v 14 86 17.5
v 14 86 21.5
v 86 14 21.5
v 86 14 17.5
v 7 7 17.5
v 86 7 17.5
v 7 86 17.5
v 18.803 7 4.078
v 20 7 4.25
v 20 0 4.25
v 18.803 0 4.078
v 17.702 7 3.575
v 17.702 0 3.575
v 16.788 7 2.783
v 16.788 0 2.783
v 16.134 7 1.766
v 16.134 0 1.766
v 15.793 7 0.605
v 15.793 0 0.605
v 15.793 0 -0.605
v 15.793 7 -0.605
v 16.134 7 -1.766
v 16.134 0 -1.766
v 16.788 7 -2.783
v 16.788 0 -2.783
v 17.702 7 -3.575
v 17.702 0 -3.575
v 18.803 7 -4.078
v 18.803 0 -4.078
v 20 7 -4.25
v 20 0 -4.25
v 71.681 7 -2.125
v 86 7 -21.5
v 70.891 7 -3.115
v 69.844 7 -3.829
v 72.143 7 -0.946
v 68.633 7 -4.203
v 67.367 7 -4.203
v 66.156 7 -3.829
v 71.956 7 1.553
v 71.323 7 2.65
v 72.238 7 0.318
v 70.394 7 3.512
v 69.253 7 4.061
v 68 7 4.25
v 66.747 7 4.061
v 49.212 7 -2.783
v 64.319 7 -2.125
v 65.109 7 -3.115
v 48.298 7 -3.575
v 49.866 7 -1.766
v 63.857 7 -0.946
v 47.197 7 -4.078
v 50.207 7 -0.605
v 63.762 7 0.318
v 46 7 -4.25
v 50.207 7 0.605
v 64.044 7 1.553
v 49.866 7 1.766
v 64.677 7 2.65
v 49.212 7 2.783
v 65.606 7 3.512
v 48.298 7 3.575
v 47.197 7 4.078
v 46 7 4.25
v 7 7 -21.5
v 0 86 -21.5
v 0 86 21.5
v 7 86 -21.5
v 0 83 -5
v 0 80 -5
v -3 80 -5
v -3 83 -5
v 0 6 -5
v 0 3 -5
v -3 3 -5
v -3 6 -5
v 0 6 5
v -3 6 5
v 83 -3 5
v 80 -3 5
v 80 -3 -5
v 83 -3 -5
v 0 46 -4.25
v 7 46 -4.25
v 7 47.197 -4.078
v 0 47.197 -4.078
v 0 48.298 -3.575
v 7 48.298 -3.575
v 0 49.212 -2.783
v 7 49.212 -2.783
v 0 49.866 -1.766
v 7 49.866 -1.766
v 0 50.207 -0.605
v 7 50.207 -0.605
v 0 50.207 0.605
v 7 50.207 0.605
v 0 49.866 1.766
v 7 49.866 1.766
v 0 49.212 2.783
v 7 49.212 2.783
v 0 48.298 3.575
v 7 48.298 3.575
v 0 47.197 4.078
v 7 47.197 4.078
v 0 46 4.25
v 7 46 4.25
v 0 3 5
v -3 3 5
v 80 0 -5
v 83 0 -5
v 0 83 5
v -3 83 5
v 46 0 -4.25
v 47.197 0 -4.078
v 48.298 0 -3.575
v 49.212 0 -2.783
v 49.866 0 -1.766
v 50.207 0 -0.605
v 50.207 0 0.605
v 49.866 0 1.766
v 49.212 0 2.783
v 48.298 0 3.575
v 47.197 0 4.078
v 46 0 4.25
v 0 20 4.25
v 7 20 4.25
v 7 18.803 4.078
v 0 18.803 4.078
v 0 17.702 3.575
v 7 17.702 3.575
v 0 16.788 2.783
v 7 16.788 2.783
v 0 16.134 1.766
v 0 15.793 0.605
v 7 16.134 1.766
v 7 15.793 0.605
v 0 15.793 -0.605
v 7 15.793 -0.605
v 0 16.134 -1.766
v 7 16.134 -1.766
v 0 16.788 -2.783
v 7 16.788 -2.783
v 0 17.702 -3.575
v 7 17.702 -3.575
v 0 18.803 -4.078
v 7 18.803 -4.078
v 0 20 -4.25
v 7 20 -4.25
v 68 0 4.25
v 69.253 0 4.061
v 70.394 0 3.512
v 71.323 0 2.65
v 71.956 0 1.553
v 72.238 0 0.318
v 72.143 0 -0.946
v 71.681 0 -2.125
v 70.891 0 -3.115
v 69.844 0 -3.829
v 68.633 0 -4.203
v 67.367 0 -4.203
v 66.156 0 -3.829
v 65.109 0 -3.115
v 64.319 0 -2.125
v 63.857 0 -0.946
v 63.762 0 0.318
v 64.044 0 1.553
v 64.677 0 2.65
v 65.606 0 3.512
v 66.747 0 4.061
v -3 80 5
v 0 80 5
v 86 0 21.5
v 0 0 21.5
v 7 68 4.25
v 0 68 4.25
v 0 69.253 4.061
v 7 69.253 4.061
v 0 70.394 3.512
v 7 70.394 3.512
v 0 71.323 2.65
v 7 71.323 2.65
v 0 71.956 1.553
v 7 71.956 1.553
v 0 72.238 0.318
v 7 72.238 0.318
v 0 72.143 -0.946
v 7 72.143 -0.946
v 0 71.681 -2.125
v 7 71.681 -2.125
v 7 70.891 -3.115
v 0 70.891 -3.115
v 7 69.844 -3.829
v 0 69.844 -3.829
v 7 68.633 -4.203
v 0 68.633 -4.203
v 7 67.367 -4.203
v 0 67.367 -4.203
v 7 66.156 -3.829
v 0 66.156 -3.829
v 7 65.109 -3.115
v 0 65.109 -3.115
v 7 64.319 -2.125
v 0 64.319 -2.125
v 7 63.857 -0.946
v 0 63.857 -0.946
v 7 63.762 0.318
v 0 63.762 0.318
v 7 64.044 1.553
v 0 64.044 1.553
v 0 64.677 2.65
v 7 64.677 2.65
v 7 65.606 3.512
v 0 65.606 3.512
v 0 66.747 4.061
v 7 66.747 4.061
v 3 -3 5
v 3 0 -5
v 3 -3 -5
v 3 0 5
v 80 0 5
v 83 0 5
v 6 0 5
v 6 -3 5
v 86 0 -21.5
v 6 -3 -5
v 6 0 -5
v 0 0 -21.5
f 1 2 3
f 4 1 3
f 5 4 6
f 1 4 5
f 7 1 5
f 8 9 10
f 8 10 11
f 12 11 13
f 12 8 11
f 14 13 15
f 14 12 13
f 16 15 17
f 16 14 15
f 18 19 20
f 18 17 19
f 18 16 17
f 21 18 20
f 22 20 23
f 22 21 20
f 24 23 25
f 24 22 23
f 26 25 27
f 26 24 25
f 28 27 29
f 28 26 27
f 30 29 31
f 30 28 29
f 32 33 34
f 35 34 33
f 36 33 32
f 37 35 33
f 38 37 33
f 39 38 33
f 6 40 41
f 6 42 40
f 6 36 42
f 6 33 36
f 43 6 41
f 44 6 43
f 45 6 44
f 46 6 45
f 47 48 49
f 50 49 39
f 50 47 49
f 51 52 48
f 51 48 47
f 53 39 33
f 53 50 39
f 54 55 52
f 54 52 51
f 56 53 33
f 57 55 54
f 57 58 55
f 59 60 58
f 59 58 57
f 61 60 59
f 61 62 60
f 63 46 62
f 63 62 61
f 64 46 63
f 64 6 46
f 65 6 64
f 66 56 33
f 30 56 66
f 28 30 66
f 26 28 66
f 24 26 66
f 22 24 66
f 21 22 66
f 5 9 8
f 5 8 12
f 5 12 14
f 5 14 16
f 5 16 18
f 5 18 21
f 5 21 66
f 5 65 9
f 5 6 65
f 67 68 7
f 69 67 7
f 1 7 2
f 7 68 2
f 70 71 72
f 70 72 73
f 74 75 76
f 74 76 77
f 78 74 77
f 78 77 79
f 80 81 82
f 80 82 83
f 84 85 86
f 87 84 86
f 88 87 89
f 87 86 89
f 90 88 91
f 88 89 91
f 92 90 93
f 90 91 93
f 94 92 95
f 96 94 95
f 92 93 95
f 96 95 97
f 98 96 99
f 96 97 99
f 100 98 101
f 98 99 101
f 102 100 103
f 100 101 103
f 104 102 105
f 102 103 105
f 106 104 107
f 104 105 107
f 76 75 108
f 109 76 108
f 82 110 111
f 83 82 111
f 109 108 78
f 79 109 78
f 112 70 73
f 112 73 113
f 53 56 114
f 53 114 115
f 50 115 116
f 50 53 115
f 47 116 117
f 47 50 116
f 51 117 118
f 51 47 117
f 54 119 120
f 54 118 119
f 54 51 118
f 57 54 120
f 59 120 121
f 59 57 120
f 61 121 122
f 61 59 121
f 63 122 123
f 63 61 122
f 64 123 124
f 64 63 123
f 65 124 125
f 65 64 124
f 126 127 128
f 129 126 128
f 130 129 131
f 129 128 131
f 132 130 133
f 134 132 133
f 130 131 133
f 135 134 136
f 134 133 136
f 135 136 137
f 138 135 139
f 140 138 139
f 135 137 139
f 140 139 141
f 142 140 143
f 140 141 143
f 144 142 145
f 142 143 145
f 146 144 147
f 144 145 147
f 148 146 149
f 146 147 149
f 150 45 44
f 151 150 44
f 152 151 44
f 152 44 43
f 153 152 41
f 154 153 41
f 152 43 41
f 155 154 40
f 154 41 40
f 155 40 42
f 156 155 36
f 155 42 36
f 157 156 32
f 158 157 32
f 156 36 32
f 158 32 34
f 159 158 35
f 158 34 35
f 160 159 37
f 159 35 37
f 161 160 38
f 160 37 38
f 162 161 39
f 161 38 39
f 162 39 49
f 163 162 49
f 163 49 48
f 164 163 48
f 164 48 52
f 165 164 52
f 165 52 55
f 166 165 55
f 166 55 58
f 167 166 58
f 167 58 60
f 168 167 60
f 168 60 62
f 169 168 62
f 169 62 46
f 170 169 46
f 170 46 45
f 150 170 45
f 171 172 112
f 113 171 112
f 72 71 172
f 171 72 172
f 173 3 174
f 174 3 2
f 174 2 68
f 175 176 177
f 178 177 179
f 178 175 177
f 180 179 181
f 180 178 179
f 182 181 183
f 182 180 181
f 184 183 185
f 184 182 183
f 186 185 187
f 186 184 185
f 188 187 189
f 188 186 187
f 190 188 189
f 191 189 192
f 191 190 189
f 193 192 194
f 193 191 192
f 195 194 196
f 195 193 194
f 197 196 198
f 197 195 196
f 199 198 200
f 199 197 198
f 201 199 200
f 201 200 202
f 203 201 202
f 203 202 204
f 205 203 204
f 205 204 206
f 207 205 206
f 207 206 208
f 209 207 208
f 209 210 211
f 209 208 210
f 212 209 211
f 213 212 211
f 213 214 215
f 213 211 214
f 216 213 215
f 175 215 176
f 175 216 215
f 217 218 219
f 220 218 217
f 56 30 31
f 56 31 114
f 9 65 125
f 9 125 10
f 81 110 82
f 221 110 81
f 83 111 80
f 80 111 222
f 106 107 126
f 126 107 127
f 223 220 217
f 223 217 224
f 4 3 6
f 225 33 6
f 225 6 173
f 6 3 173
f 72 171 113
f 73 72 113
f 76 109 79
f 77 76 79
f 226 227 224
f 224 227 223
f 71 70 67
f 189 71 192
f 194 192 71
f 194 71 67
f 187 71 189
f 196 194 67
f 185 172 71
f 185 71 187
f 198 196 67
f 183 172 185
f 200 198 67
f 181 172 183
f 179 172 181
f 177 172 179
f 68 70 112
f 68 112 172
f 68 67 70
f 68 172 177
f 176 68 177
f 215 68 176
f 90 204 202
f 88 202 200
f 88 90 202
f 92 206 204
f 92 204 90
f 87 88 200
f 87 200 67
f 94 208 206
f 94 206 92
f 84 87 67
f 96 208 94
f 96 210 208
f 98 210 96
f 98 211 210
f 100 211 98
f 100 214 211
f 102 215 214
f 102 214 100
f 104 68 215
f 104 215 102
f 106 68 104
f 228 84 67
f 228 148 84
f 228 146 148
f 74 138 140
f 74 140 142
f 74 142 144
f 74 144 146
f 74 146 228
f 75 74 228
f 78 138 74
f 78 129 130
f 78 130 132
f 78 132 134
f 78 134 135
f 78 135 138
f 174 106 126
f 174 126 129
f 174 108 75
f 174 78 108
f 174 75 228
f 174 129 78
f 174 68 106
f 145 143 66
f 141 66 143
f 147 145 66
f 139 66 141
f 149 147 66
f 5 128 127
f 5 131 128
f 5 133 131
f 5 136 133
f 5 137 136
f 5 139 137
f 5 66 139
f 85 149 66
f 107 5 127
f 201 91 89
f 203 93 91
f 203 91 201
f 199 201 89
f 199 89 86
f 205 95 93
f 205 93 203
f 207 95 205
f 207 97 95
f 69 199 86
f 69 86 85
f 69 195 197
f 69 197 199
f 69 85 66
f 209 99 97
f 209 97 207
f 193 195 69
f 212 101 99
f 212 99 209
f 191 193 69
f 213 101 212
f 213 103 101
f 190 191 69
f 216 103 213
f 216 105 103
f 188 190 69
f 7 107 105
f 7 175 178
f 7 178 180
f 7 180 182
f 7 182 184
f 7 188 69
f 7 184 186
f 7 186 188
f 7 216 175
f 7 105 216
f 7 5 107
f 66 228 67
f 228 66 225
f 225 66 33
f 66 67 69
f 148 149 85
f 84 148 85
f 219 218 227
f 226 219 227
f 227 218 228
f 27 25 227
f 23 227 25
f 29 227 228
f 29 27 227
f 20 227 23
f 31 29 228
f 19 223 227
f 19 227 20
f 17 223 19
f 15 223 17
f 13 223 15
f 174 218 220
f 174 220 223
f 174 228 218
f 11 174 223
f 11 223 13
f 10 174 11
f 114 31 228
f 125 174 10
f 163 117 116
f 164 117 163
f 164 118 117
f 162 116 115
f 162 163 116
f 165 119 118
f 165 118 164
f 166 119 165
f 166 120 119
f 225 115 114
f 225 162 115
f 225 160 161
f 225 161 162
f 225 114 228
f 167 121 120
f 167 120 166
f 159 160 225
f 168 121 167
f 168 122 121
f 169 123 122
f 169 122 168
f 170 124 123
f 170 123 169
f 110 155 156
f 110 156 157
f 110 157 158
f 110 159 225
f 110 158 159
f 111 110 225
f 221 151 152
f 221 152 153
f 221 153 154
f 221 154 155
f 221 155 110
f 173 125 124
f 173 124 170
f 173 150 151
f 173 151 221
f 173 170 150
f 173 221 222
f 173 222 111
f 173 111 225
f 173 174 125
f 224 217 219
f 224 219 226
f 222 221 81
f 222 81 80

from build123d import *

# Parameters (mm, degrees)
EXTRUDE_1_DEPTH     = 21.5
EXTRUDE_2_DEPTH     = 4
SKETCH_3_R          = 4.25
CUT_EXTRUDE_1_DEPTH = 8
SKETCH_4_W          = 3
SKETCH_4_H          = 10
EXTRUDE_3_DEPTH     = 3


with BuildPart() as part:
    # Эскиз1 → Бобышка-Вытянуть1 (new body, symmetric)
    with BuildSketch(Plane.XY):
        Polygon((0, 86), (0, 0), (86, 0), (86, 7), (7, 7), (7, 86), align=None)
    extrude(amount=EXTRUDE_1_DEPTH, both=True)

    # Эскиз2 → Бобышка-Вытянуть2 (add)
    with BuildSketch(Plane.XY.offset(21.5)):
        Polygon((86, 7), (7, 7), (7, 86), (14, 86), (86, 14), align=None)
    extrude(amount=-EXTRUDE_2_DEPTH)

    # Эскиз3 → Вырез-Вытянуть1 (cut, through all)
    with BuildSketch(Plane(origin=(0, 7, 0), x_dir=(1, 0, 0), z_dir=(0, 1, 0))):
        with Locations(Location((68, 0, 0), (0, 0, 270))):  # turned: the seam where the file's is
            Circle(SKETCH_3_R)
        with BuildLine():
            Line((20, 4.25), (46, 4.25))
            ThreePointArc((46, 4.25), (50.25, 0), (46, -4.25))
            Line((46, -4.25), (20, -4.25))
            ThreePointArc((20, -4.25), (15.75, 0), (20, 4.25))
        make_face()
    cut_extrude_1 = extrude(amount=-CUT_EXTRUDE_1_DEPTH, mode=Mode.SUBTRACT)

    # Эскиз4 → Бобышка-Вытянуть3 (add)
    with BuildSketch(Plane.XZ):
        with Locations((4.5, 0)):
            Rectangle(SKETCH_4_W, SKETCH_4_H)
        with Locations((81.5, 0)):
            Rectangle(SKETCH_4_W, SKETCH_4_H)
    extrude_3 = extrude(amount=EXTRUDE_3_DEPTH)

    # Зеркальное отражение3: Вырез-Вытянуть1, Бобышка-Вытянуть3 across plane
    add(cut_extrude_1.mirror(Plane(origin=(0, 0, 0), x_dir=(0, 0, 1), z_dir=(-0.707106781, 0.707106781, 0))), mode=Mode.SUBTRACT)
    add(extrude_3.mirror(Plane(origin=(0, 0, 0), x_dir=(0, 0, 1), z_dir=(-0.707106781, 0.707106781, 0))))


solid = part.part
